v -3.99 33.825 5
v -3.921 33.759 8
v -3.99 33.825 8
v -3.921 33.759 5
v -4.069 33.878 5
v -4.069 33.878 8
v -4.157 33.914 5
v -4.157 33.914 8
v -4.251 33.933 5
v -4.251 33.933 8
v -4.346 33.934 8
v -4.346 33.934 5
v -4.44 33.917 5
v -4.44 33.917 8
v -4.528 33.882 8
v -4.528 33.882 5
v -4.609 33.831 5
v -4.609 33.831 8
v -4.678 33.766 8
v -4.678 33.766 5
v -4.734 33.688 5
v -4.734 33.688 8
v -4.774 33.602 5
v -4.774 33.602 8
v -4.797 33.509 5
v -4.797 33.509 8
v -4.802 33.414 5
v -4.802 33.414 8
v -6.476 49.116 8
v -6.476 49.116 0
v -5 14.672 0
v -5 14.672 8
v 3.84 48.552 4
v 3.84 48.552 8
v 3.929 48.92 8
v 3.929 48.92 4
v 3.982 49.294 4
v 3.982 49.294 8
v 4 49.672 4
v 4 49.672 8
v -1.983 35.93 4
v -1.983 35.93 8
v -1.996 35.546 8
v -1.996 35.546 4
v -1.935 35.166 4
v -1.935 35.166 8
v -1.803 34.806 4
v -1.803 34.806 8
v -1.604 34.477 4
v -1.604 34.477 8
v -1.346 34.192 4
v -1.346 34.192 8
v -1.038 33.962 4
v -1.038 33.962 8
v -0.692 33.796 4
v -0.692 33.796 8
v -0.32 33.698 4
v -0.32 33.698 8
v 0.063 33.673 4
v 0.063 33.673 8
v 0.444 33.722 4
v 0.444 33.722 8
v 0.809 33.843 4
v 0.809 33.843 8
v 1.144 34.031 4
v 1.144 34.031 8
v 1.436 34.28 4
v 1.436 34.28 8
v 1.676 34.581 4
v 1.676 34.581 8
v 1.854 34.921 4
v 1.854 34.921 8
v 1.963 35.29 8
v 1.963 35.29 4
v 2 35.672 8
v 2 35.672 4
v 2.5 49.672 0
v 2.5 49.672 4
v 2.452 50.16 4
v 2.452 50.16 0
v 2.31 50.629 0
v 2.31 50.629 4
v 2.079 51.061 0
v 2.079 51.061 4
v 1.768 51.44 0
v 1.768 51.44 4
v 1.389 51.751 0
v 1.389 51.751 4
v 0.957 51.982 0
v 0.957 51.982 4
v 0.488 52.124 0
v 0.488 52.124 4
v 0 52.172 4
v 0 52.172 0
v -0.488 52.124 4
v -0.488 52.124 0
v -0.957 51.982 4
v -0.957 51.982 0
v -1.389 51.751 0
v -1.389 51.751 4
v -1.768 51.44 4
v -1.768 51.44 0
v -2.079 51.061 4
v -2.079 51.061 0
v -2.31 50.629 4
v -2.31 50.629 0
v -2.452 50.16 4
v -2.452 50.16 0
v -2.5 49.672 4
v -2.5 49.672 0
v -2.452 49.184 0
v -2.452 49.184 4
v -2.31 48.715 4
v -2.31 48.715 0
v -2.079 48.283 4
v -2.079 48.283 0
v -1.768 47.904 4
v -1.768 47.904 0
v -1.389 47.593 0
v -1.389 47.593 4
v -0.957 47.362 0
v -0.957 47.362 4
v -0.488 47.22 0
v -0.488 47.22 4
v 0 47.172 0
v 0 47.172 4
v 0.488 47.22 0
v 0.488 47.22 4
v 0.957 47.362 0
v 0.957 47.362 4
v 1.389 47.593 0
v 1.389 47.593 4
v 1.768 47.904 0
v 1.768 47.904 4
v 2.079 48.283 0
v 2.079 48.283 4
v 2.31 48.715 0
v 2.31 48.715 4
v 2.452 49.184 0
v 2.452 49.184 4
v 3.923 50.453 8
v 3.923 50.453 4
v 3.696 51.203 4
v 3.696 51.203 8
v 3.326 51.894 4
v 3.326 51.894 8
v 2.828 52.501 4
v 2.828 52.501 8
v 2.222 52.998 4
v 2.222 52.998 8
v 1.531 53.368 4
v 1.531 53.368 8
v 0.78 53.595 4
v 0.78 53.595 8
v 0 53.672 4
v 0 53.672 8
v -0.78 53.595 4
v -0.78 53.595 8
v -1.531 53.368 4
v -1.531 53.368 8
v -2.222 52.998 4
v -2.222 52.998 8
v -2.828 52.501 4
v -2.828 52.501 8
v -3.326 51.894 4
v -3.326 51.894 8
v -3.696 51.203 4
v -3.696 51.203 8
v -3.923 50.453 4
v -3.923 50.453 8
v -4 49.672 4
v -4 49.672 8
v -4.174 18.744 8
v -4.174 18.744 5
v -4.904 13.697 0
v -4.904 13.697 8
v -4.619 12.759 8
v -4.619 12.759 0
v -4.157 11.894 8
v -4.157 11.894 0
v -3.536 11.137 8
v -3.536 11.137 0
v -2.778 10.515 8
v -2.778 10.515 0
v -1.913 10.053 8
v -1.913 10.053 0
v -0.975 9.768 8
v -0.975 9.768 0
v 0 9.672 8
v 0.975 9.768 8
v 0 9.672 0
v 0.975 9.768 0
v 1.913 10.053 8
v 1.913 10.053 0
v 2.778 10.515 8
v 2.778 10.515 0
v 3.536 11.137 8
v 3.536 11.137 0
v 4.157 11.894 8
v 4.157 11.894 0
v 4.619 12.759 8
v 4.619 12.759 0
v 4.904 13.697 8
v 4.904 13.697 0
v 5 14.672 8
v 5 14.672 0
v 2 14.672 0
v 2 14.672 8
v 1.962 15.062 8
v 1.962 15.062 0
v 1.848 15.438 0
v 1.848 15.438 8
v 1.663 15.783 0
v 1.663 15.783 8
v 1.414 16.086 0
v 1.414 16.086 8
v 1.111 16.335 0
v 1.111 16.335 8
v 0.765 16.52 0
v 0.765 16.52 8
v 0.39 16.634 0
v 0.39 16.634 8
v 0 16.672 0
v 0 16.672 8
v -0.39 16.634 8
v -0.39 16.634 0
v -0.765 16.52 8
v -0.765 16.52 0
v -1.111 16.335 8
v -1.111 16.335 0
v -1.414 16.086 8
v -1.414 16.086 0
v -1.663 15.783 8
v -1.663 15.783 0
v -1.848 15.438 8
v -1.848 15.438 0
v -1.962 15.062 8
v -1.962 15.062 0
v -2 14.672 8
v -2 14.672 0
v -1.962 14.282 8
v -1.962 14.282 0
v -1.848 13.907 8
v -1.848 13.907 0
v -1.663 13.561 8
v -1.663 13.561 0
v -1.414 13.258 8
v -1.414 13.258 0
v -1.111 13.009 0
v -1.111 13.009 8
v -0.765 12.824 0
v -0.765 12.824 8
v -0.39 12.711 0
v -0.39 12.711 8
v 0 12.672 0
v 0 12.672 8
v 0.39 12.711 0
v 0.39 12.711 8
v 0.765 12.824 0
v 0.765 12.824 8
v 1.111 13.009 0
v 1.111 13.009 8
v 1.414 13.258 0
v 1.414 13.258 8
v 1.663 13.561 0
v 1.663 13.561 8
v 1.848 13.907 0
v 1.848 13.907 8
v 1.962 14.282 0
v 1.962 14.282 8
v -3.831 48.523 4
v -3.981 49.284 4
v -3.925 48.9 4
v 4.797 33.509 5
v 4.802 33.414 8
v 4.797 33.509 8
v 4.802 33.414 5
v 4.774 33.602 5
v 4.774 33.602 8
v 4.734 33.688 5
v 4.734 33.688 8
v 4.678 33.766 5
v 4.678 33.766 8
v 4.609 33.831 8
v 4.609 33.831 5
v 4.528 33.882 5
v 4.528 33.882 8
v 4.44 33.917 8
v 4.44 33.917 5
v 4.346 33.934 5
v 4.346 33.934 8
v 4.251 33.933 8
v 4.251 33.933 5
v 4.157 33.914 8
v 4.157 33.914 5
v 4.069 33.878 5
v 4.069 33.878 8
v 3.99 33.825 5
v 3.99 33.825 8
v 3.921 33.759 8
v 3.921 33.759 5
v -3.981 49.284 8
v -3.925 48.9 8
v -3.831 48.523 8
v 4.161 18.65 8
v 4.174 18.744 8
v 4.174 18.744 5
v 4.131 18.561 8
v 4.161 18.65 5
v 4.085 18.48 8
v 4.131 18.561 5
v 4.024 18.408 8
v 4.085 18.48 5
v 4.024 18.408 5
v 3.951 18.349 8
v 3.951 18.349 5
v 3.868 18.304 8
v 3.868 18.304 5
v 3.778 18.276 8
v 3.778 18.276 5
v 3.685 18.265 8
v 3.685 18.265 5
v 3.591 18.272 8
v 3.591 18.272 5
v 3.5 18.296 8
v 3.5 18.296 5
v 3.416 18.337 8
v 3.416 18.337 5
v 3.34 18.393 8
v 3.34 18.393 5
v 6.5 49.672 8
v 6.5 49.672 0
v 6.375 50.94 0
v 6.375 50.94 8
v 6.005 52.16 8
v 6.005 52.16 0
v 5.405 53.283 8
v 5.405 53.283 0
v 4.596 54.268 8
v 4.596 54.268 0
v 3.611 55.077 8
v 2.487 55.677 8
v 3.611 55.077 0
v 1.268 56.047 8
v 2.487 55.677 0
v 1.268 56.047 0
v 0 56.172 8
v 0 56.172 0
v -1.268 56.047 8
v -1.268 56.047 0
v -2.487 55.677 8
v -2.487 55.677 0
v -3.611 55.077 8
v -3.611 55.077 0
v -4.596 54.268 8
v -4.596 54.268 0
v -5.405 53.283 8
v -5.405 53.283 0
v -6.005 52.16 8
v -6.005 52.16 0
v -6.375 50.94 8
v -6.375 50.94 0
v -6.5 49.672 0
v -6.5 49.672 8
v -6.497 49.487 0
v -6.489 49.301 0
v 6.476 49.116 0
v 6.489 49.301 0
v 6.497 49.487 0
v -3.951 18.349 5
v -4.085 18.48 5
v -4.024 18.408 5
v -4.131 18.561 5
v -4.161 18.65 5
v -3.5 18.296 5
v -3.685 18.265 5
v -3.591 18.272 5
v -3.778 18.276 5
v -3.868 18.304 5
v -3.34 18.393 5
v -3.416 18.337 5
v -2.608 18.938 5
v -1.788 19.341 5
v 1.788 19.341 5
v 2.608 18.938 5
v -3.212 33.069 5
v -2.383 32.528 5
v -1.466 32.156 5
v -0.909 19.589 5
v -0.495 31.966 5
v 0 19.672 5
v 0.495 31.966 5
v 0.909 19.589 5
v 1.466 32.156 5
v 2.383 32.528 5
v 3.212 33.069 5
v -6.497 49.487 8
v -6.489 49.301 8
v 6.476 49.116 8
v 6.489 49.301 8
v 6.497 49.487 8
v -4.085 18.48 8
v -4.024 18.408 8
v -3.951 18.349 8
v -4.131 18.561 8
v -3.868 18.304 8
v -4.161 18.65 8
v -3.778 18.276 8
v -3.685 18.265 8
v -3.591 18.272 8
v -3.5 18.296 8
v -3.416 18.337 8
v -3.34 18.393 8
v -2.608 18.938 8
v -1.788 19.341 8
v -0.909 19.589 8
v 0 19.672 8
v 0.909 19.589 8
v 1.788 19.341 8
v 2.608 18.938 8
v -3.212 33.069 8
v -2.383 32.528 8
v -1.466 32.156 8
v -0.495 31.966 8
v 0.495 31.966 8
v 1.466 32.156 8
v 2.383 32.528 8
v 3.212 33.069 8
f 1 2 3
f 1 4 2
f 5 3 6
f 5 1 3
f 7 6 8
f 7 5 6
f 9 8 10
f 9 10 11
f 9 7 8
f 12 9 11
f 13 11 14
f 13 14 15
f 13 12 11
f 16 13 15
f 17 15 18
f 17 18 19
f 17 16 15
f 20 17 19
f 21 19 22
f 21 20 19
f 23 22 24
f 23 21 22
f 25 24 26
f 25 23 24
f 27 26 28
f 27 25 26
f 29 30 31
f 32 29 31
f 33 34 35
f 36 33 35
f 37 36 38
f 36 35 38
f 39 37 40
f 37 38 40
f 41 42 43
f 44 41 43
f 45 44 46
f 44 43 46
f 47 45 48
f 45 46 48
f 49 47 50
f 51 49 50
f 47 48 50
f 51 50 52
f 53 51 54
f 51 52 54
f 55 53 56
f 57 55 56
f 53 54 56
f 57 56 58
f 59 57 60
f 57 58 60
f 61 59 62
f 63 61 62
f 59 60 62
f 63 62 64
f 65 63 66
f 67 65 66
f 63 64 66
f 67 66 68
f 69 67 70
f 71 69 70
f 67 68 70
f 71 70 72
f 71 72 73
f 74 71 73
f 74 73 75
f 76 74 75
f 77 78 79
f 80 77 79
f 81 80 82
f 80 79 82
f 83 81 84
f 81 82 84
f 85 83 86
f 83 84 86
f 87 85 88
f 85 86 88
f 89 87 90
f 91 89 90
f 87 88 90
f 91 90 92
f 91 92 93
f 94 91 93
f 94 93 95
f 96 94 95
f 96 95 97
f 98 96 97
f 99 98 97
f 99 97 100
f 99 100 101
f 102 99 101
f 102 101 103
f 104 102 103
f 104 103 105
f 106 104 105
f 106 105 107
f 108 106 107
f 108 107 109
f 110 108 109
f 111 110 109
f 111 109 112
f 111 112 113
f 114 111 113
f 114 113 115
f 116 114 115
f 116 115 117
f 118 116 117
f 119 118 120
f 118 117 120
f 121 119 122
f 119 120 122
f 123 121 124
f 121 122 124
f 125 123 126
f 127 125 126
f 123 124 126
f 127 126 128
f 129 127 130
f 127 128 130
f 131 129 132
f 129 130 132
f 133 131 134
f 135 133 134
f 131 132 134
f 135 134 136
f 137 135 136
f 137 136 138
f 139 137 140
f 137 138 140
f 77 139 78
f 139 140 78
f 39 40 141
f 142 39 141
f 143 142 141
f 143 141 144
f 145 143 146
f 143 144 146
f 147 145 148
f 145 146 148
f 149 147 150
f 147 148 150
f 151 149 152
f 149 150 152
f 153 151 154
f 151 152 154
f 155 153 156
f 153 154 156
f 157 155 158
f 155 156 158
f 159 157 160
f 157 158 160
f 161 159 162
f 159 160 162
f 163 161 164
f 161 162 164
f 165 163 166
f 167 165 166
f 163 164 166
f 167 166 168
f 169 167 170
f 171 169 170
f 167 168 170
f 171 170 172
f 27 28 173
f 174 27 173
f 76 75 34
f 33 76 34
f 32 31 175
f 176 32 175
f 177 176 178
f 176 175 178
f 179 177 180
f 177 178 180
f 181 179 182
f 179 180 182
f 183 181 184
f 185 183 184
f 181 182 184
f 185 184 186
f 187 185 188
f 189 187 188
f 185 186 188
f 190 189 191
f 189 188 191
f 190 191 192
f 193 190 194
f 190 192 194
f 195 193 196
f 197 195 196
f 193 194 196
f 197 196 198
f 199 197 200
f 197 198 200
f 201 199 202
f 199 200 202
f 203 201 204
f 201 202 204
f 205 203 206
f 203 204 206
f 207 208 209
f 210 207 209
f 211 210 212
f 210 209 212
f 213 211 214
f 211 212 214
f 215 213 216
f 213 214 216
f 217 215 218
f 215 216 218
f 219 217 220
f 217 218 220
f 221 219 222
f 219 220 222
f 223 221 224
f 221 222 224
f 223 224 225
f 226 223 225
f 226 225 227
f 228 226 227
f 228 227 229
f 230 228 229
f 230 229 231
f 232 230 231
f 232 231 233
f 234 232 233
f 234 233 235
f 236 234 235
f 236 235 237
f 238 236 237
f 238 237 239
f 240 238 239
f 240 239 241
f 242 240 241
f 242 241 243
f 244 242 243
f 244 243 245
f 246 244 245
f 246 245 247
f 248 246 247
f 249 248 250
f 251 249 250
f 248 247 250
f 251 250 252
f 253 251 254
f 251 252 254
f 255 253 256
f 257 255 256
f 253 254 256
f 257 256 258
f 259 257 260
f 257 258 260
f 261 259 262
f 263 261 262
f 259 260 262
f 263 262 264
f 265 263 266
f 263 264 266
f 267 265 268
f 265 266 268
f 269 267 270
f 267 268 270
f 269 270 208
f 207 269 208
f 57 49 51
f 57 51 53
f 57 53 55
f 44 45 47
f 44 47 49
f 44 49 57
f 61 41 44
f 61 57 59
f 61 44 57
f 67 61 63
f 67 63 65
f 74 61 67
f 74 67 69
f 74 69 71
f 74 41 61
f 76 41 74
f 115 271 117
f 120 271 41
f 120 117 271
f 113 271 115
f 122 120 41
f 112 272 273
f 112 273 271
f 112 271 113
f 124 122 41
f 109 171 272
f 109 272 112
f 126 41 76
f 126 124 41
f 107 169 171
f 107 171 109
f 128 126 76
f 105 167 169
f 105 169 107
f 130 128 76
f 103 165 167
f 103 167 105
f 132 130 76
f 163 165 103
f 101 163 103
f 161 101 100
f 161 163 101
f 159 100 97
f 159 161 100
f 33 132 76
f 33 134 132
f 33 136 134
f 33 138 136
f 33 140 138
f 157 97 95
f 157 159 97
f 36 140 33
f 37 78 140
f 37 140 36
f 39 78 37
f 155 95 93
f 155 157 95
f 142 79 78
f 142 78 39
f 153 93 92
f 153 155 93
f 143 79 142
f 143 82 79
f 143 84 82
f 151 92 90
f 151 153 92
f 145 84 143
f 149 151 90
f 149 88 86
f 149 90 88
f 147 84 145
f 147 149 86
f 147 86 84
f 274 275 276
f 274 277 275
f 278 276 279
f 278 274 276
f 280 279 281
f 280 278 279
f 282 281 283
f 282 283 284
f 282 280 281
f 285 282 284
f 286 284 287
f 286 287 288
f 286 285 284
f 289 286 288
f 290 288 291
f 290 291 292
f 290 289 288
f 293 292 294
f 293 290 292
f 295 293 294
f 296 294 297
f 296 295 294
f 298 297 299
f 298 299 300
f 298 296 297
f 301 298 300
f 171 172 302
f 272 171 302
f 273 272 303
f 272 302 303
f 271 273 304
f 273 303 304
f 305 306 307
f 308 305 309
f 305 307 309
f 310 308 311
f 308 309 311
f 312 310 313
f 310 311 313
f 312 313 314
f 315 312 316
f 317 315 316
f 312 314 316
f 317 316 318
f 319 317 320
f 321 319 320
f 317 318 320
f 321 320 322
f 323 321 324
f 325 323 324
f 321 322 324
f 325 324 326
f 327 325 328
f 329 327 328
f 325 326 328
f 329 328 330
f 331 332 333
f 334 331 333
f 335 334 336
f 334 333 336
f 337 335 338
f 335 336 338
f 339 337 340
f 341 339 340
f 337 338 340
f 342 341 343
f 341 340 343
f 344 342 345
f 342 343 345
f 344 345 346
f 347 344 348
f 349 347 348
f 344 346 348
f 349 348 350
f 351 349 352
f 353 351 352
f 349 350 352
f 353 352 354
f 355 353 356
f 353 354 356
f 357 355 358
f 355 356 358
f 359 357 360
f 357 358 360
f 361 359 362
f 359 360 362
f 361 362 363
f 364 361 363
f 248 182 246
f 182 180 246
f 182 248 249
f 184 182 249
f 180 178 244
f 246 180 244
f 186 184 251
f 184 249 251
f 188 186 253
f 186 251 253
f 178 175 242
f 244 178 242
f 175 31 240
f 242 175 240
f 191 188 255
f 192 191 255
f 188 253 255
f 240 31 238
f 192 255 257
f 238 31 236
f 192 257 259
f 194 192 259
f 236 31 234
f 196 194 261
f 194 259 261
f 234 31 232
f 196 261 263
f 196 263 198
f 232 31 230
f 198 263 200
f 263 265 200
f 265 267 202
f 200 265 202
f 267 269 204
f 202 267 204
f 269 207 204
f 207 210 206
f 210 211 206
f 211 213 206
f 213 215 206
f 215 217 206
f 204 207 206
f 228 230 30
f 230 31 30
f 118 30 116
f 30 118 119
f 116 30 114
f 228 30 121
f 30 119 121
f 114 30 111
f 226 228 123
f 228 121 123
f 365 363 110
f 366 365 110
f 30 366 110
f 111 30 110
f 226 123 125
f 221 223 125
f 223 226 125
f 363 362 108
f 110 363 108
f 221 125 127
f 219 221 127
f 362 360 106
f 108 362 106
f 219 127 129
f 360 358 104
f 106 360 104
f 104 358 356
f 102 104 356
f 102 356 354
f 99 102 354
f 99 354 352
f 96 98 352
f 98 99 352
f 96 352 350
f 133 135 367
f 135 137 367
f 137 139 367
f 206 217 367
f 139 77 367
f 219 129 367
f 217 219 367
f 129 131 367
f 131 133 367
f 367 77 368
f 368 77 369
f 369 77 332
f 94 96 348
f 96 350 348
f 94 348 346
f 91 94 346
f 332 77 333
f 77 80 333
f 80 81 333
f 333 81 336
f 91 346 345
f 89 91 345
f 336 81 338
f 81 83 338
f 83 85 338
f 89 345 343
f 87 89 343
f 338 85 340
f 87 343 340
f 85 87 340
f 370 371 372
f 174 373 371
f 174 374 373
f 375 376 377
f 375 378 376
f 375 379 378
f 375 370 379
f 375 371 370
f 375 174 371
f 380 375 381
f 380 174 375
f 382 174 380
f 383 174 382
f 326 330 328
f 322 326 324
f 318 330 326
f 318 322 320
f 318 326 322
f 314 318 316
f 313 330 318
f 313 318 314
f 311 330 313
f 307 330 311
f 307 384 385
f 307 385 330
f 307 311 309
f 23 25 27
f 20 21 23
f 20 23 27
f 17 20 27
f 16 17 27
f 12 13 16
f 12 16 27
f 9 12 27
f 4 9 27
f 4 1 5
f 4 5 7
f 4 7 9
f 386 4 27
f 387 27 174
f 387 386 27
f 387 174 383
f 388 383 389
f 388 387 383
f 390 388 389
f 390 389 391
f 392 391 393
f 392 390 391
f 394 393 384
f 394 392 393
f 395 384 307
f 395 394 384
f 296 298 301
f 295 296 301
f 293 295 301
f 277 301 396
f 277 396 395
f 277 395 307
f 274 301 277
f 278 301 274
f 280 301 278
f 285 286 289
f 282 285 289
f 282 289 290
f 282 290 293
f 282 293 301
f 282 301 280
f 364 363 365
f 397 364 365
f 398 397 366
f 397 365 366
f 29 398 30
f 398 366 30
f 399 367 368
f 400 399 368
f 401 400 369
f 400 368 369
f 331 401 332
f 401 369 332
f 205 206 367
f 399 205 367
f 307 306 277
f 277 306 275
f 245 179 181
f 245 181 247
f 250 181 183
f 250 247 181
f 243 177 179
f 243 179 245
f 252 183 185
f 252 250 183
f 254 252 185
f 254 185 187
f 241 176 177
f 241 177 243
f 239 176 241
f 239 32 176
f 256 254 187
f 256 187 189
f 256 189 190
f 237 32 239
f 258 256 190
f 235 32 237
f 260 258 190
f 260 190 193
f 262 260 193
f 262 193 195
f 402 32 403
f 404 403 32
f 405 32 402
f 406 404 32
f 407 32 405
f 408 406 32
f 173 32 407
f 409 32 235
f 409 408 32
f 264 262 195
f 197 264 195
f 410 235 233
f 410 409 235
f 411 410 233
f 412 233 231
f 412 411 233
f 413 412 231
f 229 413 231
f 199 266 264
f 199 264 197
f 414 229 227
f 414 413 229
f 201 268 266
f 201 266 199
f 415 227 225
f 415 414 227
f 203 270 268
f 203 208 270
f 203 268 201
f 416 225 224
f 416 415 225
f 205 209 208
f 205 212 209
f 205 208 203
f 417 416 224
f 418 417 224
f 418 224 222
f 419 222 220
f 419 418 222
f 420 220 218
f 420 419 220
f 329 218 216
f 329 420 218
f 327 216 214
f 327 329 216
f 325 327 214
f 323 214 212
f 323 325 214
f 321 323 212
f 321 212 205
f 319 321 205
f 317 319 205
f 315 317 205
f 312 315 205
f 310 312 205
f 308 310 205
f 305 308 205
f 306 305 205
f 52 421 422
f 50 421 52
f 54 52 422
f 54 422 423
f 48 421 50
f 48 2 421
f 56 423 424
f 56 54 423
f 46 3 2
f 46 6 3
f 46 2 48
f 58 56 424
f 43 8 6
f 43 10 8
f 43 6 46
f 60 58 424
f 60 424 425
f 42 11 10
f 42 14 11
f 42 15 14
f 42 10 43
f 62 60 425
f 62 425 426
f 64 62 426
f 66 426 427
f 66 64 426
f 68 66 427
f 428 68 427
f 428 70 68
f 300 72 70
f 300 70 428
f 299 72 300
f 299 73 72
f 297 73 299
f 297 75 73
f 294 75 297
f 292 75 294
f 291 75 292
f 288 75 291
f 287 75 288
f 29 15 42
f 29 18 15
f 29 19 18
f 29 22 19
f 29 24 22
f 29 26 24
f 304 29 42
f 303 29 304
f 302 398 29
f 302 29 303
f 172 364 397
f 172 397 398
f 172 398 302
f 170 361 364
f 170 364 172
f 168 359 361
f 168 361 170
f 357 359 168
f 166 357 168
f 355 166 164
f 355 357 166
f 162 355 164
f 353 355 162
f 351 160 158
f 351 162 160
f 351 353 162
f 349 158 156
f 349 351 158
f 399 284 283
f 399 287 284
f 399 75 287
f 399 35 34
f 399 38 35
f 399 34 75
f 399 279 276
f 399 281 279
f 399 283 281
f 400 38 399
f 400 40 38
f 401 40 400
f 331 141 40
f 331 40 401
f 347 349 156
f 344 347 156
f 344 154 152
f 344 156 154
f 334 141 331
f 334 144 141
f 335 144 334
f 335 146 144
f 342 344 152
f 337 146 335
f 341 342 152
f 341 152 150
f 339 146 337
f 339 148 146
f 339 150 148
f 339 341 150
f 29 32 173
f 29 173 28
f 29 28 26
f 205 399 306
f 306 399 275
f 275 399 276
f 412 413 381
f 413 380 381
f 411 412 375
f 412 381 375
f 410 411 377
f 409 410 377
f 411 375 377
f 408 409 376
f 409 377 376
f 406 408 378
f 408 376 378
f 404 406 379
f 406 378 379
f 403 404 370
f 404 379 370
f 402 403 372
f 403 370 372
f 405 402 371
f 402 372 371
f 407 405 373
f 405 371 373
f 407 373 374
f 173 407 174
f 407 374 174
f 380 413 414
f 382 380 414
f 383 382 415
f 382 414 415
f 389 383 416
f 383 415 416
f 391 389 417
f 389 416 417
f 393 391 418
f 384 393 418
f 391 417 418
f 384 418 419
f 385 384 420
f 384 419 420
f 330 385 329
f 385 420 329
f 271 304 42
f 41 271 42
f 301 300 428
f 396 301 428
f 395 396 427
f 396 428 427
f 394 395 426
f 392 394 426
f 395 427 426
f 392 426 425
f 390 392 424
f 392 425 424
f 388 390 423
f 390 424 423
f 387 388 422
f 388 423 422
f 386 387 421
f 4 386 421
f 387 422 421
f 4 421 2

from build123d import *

# Parameters (mm, degrees)
F1_DEPTH = 8
F2_R     = 2.5
F2_R_2   = 2
F3_DEPTH = 25
F5_DEPTH = 4
F7_DEPTH = 3
F8_R     = 0.5
F9_R     = 0.5


# Not quite as in the source:
# - a feature names something its author has since deleted; it is built from what else it names


with BuildPart() as f1:
    # F0 (on Top) → F1 (new body)
    with BuildSketch(Plane.XY):
        with BuildLine():
            Line((6.4761662253, 49.1160303571), (6.5, 49.6721517667))
            ThreePointArc((6.5, 49.6721517667), (0, 56.1721517667), (-6.5, 49.6721517667))
            Line((-6.5, 49.6721517667), (-6.4761662253, 49.1160303571))
            ThreePointArc((-6.4761662253, 49.1160303571), (0, 43.1721517667), (6.4761662253, 49.1160303571))
        make_face()
        with BuildLine():
            ThreePointArc((6.4761662253, 49.1160303571), (6.4940388228, 49.3938358172), (6.5, 49.6721517667))
            Line((6.5, 49.6721517667), (6.4761662253, 49.1160303571))
        make_face()
        with BuildLine():
            Line((-6.4761662253, 49.1160303571), (-6.5, 49.6721517667))
            ThreePointArc((-6.5, 49.6721517667), (-6.4940388228, 49.3938358172), (-6.4761662253, 49.1160303571))
        make_face()
        with BuildLine():
            Line((5, 14.6721517667), (6.4761662253, 49.1160303571))
            ThreePointArc((6.4761662253, 49.1160303571), (0, 43.1721517667), (-6.4761662253, 49.1160303571))
            Line((-6.4761662253, 49.1160303571), (-5, 14.6721517667))
            ThreePointArc((-5, 14.6721517667), (0, 19.6721517667), (5, 14.6721517667))
        make_face()
        with BuildLine():
            ThreePointArc((-5, 14.6721517667), (0, 9.6721517667), (5, 14.6721517667))
            ThreePointArc((5, 14.6721517667), (0, 19.6721517667), (-5, 14.6721517667))
        make_face()
    extrude(amount=F1_DEPTH)

    # F2 (on face) → F3 (cut)
    with BuildSketch(Plane.XY.offset(8)):
        with Locations((0, 49.6721517667)):
            Circle(F2_R)
        with Locations((0, 14.6721517667)):
            Circle(F2_R_2)
    extrude(amount=-F3_DEPTH, mode=Mode.SUBTRACT)

    # F4 (on face) → F5 (cut)
    with BuildSketch(Plane.XY.offset(8)):
        with BuildLine():
            Line((3.84, 48.5521517667), (4, 49.6721517667))
            ThreePointArc((4, 49.6721517667), (0, 53.6721517667), (-4, 49.6721517667))
            Line((-4, 49.6721517667), (-3.8313540205, 48.522923169))
            ThreePointArc((-3.8313540205, 48.522923169), (0.0152402747, 45.6721808001), (3.84, 48.5521517667))
        make_face()
        with BuildLine():
            ThreePointArc((3.84, 48.5521517667), (3.9597979746, 49.1064663418), (4, 49.6721517667))
            Line((4, 49.6721517667), (3.84, 48.5521517667))
        make_face()
        with BuildLine():
            Line((-3.8313540205, 48.522923169), (-4, 49.6721517667))
            ThreePointArc((-4, 49.6721517667), (-3.9576139328, 49.0913833455), (-3.8313540205, 48.522923169))
        make_face()
        with BuildLine():
            Line((2, 35.6721517667), (3.84, 48.5521517667))
            ThreePointArc((3.84, 48.5521517667), (0.0152402747, 45.6721808001), (-3.8313540205, 48.522923169))
            Line((-3.8313540205, 48.522923169), (-1.9833417846, 35.929747119))
            ThreePointArc((-1.9833417846, 35.929747119), (0.1290667091, 37.6679828679), (2, 35.6721517667))
        make_face()
        with BuildLine():
            ThreePointArc((-1.9833417846, 35.929747119), (-0.1290667091, 33.6763206655), (2, 35.6721517667))
            ThreePointArc((2, 35.6721517667), (0.1290667091, 37.6679828679), (-1.9833417846, 35.929747119))
        make_face()
    extrude(amount=-F5_DEPTH, mode=Mode.SUBTRACT)

    # F6 (on face) → F7 (cut)
    with BuildSketch(Plane.XY.offset(8)):
        with BuildLine():
            ThreePointArc((-4.1204651564, 17.5044241573), (0, 19.6721517667), (4.1204651564, 17.5044241573))
            Line((4.1204651564, 17.5044241573), (4.8918937278, 35.5044241573))
            ThreePointArc((4.8918937278, 35.5044241573), (0, 31.9420729635), (-4.8918937278, 35.5044241573))
            Line((-4.8918937278, 35.5044241573), (-4.1204651564, 17.5044241573))
        make_face()
    extrude(amount=-F7_DEPTH, mode=Mode.SUBTRACT)

    # F8
    f8_edges = [f1.edges().sort_by_distance(p)[0] for p in [
        (4.891894, 35.504424, 6.5),
    ]]
    fillet(f8_edges, radius=F8_R)

    # F9
    f9_edges = [f1.edges().sort_by_distance(p)[0] for p in [
        (-4.891894, 35.504424, 6.5),
        (4.120465, 17.504424, 6.5),
        (-4.120465, 17.504424, 6.5),
    ]]
    fillet(f9_edges, radius=F9_R)


solid = f1.part
